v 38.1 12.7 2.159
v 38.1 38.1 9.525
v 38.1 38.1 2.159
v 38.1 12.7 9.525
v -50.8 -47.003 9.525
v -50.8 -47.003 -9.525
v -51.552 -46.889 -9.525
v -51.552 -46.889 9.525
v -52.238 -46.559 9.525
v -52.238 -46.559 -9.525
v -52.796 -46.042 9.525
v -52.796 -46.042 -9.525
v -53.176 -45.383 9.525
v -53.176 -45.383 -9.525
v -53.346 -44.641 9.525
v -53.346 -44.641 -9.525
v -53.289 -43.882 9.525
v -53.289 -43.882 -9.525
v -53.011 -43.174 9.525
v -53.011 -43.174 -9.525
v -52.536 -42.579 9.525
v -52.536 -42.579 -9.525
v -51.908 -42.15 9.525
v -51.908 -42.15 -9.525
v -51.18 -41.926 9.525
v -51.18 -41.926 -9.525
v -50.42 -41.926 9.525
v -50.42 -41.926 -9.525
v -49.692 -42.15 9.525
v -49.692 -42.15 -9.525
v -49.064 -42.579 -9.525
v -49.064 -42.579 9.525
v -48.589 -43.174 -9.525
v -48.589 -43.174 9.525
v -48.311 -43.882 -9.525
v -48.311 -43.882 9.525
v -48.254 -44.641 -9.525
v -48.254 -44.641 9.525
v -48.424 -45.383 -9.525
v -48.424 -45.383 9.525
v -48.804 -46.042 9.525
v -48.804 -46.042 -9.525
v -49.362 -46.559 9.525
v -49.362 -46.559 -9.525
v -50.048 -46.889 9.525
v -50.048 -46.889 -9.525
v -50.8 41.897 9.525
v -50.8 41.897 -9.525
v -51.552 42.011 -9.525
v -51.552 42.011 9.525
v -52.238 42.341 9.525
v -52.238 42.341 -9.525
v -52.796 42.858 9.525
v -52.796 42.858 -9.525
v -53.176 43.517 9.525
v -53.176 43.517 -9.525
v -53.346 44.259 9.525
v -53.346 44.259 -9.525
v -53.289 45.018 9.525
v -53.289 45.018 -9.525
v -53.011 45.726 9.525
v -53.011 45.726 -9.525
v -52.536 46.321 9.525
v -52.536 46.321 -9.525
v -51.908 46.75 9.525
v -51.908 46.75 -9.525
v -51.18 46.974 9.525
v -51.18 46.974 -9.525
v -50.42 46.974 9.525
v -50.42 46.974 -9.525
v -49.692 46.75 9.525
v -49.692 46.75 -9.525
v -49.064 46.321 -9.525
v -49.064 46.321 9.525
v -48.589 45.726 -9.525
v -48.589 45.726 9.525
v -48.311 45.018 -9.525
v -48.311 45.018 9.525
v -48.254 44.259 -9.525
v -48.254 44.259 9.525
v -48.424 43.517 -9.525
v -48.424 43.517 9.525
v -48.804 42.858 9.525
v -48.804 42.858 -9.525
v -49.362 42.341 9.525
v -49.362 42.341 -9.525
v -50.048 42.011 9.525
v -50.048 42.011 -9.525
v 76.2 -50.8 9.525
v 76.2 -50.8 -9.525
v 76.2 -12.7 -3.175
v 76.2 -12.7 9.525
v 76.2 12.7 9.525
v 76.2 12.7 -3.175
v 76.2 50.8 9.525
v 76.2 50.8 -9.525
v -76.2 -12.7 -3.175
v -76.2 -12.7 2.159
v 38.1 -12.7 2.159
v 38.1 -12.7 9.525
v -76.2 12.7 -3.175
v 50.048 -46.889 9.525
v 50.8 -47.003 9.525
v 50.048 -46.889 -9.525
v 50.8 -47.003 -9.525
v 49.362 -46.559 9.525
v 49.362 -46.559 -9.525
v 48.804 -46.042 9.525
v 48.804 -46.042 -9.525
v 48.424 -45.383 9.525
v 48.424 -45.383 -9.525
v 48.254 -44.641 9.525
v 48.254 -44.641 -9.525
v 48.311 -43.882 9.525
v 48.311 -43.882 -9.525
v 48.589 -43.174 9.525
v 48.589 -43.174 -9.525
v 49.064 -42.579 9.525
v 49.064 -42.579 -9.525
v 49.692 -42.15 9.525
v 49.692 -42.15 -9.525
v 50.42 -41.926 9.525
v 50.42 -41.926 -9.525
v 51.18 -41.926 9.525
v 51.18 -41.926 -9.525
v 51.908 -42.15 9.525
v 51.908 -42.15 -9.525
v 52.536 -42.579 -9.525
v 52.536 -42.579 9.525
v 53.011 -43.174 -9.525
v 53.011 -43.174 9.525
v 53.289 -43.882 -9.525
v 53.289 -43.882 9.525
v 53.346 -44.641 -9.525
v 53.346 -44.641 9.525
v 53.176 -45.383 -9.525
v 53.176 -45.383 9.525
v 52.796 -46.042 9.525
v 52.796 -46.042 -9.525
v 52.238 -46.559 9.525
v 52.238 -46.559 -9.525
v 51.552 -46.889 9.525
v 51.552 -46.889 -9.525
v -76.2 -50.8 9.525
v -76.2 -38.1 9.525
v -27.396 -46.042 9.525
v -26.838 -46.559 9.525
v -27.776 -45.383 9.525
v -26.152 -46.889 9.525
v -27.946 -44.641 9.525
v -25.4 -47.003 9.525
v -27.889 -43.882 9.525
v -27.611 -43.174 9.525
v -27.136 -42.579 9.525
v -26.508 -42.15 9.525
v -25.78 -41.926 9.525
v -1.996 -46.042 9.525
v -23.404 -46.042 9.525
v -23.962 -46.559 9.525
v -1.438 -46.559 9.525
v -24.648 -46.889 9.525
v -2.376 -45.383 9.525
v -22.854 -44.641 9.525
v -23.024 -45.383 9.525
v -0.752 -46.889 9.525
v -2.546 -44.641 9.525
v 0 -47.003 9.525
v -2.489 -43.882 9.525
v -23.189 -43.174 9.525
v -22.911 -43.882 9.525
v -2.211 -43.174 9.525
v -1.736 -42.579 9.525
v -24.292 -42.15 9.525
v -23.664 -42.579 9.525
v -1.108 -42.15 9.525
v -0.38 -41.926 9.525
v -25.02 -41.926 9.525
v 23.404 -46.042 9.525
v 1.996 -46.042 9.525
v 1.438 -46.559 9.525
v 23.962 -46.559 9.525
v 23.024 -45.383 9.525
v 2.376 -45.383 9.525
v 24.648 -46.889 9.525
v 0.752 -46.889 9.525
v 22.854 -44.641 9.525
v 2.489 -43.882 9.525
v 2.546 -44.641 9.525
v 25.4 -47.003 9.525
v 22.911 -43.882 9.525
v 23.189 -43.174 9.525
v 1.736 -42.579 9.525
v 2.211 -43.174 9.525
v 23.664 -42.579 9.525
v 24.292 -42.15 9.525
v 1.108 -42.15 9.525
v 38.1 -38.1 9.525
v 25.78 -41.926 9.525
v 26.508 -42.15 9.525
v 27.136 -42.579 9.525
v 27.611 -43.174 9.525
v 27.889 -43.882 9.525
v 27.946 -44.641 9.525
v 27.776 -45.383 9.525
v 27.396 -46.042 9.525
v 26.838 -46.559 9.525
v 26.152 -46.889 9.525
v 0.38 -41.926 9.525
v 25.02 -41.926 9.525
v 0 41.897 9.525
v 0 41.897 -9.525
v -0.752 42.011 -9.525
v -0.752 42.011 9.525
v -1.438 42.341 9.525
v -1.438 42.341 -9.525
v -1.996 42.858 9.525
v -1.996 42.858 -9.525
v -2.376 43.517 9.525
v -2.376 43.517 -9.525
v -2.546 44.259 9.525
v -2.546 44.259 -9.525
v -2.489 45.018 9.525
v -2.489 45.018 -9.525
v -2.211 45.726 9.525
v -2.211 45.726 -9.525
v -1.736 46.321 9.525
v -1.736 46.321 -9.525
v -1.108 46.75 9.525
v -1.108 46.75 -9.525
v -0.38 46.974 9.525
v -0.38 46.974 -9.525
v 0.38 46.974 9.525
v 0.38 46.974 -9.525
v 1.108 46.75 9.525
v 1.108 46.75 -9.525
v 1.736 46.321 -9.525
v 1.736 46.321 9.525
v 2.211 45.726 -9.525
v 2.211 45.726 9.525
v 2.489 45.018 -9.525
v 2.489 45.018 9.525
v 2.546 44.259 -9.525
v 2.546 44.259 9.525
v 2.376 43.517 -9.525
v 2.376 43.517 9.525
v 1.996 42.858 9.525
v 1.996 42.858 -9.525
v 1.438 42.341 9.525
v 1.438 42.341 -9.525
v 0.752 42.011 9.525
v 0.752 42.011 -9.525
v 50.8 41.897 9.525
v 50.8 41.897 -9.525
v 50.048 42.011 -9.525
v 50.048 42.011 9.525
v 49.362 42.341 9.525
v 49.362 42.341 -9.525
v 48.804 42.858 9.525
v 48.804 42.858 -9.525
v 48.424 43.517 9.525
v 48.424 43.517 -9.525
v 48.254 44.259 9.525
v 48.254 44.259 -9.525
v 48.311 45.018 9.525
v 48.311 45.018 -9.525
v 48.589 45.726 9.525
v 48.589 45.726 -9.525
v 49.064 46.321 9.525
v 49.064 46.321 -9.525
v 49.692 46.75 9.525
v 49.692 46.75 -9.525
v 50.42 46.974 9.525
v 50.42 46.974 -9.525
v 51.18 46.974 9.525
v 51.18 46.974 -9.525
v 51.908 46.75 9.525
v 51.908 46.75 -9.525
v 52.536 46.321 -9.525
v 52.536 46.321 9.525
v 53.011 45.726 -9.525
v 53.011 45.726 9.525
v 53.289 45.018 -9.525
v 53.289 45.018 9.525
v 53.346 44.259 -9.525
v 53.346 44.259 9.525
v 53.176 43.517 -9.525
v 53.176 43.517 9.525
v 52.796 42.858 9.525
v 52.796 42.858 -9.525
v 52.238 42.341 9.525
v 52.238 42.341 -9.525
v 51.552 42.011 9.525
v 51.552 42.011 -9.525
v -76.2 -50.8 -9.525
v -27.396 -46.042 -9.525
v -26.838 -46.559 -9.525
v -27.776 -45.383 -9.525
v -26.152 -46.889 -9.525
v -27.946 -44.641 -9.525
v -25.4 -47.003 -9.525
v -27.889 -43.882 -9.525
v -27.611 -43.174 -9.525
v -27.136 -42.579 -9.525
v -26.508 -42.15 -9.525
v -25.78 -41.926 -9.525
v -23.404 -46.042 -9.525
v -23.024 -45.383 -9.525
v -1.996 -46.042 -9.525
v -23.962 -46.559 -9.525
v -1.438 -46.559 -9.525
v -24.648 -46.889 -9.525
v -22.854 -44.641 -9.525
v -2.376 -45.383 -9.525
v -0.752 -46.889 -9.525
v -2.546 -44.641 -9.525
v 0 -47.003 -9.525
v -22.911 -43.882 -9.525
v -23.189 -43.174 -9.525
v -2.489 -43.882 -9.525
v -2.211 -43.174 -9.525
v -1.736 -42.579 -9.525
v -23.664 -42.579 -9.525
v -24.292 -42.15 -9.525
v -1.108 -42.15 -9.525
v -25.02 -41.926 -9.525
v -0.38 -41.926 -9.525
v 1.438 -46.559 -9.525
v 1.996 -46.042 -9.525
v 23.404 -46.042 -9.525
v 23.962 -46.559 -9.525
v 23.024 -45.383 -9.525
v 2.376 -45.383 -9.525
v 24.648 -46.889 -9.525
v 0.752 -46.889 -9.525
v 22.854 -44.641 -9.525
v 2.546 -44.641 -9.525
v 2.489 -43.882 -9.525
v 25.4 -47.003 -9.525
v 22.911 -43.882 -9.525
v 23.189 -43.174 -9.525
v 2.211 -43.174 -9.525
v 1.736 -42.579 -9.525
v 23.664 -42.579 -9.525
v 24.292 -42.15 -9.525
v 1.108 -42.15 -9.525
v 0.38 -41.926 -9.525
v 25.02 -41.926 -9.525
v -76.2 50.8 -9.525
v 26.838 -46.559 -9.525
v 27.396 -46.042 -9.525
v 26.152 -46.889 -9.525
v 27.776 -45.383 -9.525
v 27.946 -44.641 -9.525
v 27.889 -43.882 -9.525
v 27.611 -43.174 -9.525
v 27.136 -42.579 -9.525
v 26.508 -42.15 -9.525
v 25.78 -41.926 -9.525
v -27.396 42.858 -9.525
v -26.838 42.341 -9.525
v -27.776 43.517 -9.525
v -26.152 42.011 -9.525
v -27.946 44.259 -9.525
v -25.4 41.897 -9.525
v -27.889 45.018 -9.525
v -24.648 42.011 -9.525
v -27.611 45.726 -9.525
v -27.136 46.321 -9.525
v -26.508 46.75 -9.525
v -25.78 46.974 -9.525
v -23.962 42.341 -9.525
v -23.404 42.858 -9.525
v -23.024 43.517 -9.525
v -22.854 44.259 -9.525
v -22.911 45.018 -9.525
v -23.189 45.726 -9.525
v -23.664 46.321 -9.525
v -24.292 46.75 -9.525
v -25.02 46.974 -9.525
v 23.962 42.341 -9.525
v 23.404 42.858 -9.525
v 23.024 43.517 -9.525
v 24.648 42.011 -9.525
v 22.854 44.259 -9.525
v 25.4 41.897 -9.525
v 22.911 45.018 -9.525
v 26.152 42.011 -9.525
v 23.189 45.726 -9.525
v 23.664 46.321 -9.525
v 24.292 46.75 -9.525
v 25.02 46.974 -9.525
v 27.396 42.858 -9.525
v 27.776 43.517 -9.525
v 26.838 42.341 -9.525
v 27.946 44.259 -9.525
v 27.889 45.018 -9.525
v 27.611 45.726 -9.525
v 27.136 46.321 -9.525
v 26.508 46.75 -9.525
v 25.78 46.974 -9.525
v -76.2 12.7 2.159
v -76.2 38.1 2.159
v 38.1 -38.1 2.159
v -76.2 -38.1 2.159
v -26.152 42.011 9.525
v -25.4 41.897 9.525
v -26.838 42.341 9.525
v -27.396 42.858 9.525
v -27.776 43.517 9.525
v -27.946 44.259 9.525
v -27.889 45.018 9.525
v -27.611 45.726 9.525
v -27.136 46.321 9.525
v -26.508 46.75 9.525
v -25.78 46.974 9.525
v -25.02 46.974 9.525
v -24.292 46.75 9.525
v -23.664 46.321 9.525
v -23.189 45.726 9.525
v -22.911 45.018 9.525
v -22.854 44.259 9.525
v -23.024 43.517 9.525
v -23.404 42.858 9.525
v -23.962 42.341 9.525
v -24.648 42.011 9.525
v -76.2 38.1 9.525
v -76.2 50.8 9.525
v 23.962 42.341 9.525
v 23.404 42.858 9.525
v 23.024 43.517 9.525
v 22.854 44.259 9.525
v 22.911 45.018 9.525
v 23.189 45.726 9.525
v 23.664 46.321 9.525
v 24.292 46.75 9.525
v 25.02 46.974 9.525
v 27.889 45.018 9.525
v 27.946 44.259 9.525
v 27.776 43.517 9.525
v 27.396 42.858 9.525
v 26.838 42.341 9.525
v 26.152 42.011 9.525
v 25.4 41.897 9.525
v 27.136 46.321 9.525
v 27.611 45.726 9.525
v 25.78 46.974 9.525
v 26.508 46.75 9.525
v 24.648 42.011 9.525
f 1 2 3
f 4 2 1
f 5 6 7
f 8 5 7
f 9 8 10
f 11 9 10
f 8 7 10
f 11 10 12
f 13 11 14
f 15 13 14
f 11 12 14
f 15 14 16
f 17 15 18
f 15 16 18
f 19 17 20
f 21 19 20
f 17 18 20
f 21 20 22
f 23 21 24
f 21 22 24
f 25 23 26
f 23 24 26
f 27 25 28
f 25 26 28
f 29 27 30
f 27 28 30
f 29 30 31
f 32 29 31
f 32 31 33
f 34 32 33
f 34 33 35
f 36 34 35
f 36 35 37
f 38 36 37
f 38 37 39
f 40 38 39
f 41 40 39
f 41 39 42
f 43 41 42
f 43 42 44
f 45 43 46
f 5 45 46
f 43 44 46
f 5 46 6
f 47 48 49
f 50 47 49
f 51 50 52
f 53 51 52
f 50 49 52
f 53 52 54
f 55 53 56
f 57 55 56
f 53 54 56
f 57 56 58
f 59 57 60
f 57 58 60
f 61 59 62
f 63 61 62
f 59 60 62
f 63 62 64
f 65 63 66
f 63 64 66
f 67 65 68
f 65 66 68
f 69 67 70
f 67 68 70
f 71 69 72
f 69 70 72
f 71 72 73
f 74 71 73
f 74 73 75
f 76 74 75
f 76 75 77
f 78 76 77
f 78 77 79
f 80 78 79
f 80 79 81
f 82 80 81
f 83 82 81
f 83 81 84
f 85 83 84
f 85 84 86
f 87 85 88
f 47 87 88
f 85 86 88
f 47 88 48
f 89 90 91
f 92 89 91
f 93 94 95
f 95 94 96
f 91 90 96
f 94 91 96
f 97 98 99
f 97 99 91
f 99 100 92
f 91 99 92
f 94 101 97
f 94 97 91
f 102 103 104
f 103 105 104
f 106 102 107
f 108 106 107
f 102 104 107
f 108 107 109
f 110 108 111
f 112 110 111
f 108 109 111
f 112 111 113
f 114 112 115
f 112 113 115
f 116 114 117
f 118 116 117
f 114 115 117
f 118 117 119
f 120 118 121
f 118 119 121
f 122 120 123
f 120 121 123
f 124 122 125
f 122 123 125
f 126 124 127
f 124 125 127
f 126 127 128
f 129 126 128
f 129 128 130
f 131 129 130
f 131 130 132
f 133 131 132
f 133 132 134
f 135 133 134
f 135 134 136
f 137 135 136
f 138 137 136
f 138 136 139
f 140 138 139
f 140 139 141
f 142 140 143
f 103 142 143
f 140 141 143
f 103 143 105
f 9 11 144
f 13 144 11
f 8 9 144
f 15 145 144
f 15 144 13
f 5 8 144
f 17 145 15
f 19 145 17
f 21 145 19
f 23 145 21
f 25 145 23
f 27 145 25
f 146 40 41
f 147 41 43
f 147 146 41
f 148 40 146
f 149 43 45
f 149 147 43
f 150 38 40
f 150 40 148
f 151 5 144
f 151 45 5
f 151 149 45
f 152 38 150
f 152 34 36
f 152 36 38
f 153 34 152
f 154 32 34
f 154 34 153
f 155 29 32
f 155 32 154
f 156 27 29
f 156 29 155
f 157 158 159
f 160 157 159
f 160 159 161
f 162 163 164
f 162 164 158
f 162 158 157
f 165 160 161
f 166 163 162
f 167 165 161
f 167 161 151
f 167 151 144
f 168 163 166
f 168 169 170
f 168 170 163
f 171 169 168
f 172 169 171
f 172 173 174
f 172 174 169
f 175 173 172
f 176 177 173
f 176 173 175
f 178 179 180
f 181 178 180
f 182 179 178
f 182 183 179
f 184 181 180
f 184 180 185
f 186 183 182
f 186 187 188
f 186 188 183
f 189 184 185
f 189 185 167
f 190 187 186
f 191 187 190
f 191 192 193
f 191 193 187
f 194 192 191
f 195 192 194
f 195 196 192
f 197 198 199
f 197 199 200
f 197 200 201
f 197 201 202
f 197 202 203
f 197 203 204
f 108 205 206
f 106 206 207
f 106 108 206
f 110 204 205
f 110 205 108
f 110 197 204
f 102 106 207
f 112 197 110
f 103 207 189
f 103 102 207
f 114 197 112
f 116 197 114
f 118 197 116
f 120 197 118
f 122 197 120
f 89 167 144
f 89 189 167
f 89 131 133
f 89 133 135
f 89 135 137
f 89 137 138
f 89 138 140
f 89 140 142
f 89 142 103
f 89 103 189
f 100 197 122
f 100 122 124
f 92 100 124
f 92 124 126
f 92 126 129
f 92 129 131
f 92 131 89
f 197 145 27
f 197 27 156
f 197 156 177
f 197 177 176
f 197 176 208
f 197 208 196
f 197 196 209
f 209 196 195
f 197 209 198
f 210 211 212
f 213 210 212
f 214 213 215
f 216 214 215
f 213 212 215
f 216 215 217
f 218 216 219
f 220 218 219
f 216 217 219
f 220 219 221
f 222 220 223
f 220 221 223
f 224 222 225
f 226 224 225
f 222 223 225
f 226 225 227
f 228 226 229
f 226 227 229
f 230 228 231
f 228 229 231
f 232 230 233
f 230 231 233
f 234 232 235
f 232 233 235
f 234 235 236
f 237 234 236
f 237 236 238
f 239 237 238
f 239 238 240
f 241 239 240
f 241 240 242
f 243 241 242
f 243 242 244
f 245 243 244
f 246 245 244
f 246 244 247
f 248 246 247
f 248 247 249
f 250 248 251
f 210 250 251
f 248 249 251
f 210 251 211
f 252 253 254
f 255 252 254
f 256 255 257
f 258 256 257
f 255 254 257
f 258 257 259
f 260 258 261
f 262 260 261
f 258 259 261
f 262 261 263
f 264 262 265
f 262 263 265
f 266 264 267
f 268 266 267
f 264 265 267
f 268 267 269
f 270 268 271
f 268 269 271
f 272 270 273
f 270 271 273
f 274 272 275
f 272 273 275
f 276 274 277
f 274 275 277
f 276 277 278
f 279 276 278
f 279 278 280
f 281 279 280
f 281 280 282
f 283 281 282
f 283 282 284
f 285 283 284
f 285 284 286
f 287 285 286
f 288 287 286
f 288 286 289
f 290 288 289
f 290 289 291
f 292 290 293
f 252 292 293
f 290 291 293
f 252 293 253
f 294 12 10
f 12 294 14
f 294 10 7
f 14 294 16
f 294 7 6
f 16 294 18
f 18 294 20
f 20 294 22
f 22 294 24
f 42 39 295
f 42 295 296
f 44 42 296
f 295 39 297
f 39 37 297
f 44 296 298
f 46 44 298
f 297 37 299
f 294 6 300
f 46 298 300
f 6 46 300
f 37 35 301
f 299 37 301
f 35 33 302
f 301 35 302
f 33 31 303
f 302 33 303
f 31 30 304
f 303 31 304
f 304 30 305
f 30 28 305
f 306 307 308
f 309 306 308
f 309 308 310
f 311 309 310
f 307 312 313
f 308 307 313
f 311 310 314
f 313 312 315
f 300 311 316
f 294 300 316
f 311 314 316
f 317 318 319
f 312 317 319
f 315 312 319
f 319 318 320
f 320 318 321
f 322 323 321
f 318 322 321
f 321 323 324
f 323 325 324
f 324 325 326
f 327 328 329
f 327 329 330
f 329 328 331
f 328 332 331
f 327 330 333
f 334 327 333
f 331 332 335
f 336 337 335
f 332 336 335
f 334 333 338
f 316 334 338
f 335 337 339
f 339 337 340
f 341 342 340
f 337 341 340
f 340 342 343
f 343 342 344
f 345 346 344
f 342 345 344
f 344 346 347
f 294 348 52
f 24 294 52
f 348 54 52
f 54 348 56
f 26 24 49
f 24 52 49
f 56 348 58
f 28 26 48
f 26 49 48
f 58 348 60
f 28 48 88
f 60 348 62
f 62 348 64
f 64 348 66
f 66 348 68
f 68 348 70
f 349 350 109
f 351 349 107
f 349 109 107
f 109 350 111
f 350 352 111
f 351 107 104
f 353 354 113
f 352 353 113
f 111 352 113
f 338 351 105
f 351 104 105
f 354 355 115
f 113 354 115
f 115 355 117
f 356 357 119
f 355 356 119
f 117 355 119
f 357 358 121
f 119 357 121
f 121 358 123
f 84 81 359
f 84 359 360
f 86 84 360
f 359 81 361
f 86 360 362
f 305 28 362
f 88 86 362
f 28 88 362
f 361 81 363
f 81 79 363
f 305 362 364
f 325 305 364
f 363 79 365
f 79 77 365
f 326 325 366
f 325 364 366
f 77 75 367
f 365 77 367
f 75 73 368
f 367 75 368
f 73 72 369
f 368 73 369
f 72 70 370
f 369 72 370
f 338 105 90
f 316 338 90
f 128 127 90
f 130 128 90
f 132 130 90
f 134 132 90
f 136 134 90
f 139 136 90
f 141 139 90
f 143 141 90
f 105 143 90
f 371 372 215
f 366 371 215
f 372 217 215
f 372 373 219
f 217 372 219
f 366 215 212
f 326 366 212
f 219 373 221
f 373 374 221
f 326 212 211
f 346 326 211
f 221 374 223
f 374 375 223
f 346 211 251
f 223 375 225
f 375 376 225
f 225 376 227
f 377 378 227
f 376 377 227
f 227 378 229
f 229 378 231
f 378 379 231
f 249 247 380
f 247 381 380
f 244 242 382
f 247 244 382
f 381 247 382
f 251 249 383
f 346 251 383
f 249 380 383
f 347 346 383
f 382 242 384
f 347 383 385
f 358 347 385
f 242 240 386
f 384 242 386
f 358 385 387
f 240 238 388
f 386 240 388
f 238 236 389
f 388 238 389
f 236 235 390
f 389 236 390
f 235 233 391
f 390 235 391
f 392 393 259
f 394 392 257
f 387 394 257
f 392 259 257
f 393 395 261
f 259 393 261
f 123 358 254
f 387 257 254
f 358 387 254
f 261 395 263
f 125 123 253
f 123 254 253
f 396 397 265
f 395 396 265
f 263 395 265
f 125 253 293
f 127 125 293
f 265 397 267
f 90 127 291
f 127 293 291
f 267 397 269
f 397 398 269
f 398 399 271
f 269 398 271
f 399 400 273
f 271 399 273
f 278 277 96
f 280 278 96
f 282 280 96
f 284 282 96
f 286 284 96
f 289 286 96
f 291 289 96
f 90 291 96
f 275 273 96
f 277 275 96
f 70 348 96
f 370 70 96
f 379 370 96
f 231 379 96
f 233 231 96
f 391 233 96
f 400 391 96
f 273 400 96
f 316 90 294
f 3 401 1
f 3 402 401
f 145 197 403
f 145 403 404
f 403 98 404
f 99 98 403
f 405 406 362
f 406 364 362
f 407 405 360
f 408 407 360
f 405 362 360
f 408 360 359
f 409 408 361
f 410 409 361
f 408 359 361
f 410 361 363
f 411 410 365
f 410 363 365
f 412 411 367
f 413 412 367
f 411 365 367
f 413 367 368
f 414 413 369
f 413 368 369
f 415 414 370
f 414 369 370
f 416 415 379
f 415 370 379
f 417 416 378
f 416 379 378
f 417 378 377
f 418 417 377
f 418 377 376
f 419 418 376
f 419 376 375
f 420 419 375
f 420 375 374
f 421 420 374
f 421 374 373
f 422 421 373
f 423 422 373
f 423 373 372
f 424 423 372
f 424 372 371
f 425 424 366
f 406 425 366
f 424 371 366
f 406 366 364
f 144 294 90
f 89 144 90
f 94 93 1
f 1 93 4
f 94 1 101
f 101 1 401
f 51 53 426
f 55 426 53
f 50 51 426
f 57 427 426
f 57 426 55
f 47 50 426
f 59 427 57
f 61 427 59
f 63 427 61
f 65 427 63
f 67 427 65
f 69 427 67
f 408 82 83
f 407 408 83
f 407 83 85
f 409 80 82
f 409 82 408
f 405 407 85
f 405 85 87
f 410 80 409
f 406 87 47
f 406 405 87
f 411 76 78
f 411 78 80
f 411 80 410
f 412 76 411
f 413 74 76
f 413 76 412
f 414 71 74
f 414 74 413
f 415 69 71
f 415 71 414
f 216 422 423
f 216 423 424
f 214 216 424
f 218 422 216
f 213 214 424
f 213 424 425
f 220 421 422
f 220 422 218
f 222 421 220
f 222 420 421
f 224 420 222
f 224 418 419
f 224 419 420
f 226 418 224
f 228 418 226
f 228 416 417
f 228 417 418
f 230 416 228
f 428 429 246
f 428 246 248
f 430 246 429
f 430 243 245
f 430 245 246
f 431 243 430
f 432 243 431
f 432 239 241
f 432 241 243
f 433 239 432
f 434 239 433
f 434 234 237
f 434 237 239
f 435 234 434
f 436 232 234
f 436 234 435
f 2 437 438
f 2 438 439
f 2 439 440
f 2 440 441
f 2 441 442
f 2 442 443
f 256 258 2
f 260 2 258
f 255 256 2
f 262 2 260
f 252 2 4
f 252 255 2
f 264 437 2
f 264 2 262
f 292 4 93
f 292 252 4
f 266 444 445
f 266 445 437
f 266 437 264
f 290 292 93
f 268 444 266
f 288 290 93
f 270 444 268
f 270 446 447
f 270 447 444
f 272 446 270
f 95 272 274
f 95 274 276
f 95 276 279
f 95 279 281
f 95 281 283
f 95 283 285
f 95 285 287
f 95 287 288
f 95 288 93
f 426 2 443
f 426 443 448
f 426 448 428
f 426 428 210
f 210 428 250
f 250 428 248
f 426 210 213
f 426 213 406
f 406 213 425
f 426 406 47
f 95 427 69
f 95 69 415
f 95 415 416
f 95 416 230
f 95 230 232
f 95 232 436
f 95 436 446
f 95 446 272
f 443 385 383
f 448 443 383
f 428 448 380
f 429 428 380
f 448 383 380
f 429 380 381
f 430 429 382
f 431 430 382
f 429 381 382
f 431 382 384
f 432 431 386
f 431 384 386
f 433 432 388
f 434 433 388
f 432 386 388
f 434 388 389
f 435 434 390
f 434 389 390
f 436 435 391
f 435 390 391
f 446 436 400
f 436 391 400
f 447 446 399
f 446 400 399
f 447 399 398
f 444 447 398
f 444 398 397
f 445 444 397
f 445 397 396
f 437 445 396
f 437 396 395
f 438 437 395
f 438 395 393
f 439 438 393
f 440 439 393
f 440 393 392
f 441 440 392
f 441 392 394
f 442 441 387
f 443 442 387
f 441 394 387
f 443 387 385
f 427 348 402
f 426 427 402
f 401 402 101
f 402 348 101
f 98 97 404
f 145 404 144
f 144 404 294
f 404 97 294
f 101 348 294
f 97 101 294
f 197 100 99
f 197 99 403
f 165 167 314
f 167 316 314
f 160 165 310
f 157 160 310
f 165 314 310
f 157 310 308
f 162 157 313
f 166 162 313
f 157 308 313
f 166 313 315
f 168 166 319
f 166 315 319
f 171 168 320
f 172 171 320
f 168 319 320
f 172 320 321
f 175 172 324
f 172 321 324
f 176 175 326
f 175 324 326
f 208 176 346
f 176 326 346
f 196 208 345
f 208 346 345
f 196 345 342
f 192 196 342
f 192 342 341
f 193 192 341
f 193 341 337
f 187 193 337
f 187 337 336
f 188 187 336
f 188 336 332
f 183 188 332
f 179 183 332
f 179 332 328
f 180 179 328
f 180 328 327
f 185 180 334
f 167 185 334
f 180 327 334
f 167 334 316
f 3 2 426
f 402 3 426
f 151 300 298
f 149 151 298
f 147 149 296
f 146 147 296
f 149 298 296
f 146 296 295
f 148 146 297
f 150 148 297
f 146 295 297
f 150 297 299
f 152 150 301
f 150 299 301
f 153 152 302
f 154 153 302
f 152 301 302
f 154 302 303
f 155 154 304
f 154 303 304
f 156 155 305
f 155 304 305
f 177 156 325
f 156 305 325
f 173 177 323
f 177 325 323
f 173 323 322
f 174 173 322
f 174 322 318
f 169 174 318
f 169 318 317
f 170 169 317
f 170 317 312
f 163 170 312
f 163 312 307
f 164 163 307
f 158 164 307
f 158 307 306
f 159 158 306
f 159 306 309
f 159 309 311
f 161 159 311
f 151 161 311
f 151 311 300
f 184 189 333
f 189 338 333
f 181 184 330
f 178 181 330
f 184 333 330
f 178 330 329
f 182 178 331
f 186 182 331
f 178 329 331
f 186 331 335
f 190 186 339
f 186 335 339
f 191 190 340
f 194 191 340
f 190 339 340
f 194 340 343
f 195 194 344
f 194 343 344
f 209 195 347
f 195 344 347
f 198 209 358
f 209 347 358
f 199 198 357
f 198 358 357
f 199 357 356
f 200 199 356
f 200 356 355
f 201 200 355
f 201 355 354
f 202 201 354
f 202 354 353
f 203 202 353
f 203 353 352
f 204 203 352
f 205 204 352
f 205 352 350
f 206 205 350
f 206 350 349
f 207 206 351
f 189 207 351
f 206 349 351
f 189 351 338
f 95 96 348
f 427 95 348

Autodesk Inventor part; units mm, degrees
ref_plane "YZ Plane" through (0, 0, 0) normal (1, 0, 0) x (0, 1, 0)
ref_plane "XZ Plane" through (0, 0, 0) normal (0, 1, 0) x (-1, 0, 0)
sketch "Sketch1" plane through (0, 0, 0) normal (0, 0, 1) x (1, 0, 0)
  line L0 (-76.2, -50.8) -> (76.2, -50.8)
  line L1 (76.2, -50.8) -> (76.2, 50.8)
  line L2 (76.2, 50.8) -> (-76.2, 50.8)
  line L3 (-76.2, 50.8) -> (-76.2, -50.8)
  line L4 (-76.2, -50.8) -> (76.2, 50.8) construction
  line L5 (76.2, -50.8) -> (-76.2, 50.8) construction
  point P0 (0, 0)
  dimension "d0" = 152.4
  dimension "d1" = 101.6
extrude "Extrusion1" add sketch "Sketch1" along normal mid plane 19.05
sketch "Sketch3" plane through (0, 0, 9.525) normal (0, 0, 1) x (1, 0, 0)
  line L0 (-76.2, -12.7) -> (76.2, -12.7)
  line L1 (76.2, -12.7) -> (76.2, 12.7)
  line L2 (76.2, 12.7) -> (-76.2, 12.7)
  line L3 (-76.2, 12.7) -> (-76.2, -12.7)
  line L4 (-76.2, -12.7) -> (76.2, 12.7) construction
  line L5 (76.2, -12.7) -> (-76.2, 12.7) construction
  point P0 (0, 0)
  dimension "d7" = 25.4
  dimension "d19" = 152.4
extrude "Extrusion3" cut sketch "Sketch3" against normal blind 12.7
ref_plane "Work Plane1" through (-76.2, 50.8, 9.525) normal (0, 0, 1) x (1, 0, 0)
sketch "Sketch8" plane through (0, 0, 9.525) normal (0, 0, 1) x (1, 0, 0)
  line L0 (-76.2, -12.7) -> (-76.2, 12.7) projected
  line L1 (-76.2, 0) -> (38.1, 0)
  line L2 (38.1, 0) -> (38.1, 38.1)
  line L3 (38.1, 38.1) -> (-76.2, 38.1)
  line L4 (-76.2, 38.1) -> (-76.2, 0)
  line L5 (38.1, 0) -> (38.1, -38.1)
  line L6 (38.1, -38.1) -> (-76.2, -38.1)
  line L7 (-76.2, -38.1) -> (-76.2, 0)
  point P0 (0, 0)
  dimension "d51" = 114.3
  dimension "d52" = 38.1
extrude "Extrusion6" cut sketch "Sketch8" against normal blind 7.366
sketch "Sketch9" plane through (0, 0, 9.525) normal (0, 0, 1) x (1, 0, 0)
  line L0 (-76.2, 50.8) -> (-76.2, 38.1) construction
  line L1 (-76.2, 44.45) -> (76.2, 44.45) construction
  line L2 (76.2, 50.8) -> (76.2, -50.8) construction
  line L3 (-76.2, 44.45) -> (-76.2, -44.4609) construction
  point P0 (0, 0)
  point P1 (-50.8, 44.45)
  point P2 (-25.4, 44.45)
  point P3 (0, 44.45)
  point P4 (25.4, 44.45)
  point P5 (50.8, 44.45)
  point P6 (-50.8, -44.45)
  point P7 (-25.4, -44.45)
  point P8 (0, -44.45)
  point P9 (25.4, -44.45)
  point P10 (50.8, -44.45)
  point P11 (-50.8, -133.35)
  point P12 (-25.4, -133.35)
  point P13 (0, -133.35)
  point P14 (25.4, -133.35)
  point P15 (50.8, -133.35)
  point P16 (-50.8, -222.25)
  point P17 (-25.4, -222.25)
  point P18 (0, -222.25)
  point P19 (25.4, -222.25)
  point P20 (50.8, -222.25)
  dimension "d55" = 25.4
  dimension "d58" = 25.4
  dimension "d61" = 88.9
hole "Hole2" at (-50.8, 44.45, 9.525) at (-25.4, 44.45, 9.525) at (0, 44.45, 9.525) at (25.4, 44.45, 9.525) at (50.8, 44.45, 9.525) at (-50.8, -44.45, 9.525) at (-25.4, -44.45, 9.525) at (0, -44.45, 9.525) at (25.4, -44.45, 9.525) at (50.8, -44.45, 9.525) at (-50.8, -133.35, 9.525) at (-25.4, -133.35, 9.525) at (0, -133.35, 9.525) at (25.4, -133.35, 9.525) at (50.8, -133.35, 9.525) at (-50.8, -222.25, 9.525) at (-25.4, -222.25, 9.525) at (0, -222.25, 9.525) at (25.4, -222.25, 9.525) at (50.8, -222.25, 9.525) direction (0, 0, -1) diameter 5.1054 end through all clearance for "Flat Head Machine Screw (82)" size "#10" standard "Ansi Unified Screw Threads"
properties part number "pistonHousing" material "PET Plastic"
